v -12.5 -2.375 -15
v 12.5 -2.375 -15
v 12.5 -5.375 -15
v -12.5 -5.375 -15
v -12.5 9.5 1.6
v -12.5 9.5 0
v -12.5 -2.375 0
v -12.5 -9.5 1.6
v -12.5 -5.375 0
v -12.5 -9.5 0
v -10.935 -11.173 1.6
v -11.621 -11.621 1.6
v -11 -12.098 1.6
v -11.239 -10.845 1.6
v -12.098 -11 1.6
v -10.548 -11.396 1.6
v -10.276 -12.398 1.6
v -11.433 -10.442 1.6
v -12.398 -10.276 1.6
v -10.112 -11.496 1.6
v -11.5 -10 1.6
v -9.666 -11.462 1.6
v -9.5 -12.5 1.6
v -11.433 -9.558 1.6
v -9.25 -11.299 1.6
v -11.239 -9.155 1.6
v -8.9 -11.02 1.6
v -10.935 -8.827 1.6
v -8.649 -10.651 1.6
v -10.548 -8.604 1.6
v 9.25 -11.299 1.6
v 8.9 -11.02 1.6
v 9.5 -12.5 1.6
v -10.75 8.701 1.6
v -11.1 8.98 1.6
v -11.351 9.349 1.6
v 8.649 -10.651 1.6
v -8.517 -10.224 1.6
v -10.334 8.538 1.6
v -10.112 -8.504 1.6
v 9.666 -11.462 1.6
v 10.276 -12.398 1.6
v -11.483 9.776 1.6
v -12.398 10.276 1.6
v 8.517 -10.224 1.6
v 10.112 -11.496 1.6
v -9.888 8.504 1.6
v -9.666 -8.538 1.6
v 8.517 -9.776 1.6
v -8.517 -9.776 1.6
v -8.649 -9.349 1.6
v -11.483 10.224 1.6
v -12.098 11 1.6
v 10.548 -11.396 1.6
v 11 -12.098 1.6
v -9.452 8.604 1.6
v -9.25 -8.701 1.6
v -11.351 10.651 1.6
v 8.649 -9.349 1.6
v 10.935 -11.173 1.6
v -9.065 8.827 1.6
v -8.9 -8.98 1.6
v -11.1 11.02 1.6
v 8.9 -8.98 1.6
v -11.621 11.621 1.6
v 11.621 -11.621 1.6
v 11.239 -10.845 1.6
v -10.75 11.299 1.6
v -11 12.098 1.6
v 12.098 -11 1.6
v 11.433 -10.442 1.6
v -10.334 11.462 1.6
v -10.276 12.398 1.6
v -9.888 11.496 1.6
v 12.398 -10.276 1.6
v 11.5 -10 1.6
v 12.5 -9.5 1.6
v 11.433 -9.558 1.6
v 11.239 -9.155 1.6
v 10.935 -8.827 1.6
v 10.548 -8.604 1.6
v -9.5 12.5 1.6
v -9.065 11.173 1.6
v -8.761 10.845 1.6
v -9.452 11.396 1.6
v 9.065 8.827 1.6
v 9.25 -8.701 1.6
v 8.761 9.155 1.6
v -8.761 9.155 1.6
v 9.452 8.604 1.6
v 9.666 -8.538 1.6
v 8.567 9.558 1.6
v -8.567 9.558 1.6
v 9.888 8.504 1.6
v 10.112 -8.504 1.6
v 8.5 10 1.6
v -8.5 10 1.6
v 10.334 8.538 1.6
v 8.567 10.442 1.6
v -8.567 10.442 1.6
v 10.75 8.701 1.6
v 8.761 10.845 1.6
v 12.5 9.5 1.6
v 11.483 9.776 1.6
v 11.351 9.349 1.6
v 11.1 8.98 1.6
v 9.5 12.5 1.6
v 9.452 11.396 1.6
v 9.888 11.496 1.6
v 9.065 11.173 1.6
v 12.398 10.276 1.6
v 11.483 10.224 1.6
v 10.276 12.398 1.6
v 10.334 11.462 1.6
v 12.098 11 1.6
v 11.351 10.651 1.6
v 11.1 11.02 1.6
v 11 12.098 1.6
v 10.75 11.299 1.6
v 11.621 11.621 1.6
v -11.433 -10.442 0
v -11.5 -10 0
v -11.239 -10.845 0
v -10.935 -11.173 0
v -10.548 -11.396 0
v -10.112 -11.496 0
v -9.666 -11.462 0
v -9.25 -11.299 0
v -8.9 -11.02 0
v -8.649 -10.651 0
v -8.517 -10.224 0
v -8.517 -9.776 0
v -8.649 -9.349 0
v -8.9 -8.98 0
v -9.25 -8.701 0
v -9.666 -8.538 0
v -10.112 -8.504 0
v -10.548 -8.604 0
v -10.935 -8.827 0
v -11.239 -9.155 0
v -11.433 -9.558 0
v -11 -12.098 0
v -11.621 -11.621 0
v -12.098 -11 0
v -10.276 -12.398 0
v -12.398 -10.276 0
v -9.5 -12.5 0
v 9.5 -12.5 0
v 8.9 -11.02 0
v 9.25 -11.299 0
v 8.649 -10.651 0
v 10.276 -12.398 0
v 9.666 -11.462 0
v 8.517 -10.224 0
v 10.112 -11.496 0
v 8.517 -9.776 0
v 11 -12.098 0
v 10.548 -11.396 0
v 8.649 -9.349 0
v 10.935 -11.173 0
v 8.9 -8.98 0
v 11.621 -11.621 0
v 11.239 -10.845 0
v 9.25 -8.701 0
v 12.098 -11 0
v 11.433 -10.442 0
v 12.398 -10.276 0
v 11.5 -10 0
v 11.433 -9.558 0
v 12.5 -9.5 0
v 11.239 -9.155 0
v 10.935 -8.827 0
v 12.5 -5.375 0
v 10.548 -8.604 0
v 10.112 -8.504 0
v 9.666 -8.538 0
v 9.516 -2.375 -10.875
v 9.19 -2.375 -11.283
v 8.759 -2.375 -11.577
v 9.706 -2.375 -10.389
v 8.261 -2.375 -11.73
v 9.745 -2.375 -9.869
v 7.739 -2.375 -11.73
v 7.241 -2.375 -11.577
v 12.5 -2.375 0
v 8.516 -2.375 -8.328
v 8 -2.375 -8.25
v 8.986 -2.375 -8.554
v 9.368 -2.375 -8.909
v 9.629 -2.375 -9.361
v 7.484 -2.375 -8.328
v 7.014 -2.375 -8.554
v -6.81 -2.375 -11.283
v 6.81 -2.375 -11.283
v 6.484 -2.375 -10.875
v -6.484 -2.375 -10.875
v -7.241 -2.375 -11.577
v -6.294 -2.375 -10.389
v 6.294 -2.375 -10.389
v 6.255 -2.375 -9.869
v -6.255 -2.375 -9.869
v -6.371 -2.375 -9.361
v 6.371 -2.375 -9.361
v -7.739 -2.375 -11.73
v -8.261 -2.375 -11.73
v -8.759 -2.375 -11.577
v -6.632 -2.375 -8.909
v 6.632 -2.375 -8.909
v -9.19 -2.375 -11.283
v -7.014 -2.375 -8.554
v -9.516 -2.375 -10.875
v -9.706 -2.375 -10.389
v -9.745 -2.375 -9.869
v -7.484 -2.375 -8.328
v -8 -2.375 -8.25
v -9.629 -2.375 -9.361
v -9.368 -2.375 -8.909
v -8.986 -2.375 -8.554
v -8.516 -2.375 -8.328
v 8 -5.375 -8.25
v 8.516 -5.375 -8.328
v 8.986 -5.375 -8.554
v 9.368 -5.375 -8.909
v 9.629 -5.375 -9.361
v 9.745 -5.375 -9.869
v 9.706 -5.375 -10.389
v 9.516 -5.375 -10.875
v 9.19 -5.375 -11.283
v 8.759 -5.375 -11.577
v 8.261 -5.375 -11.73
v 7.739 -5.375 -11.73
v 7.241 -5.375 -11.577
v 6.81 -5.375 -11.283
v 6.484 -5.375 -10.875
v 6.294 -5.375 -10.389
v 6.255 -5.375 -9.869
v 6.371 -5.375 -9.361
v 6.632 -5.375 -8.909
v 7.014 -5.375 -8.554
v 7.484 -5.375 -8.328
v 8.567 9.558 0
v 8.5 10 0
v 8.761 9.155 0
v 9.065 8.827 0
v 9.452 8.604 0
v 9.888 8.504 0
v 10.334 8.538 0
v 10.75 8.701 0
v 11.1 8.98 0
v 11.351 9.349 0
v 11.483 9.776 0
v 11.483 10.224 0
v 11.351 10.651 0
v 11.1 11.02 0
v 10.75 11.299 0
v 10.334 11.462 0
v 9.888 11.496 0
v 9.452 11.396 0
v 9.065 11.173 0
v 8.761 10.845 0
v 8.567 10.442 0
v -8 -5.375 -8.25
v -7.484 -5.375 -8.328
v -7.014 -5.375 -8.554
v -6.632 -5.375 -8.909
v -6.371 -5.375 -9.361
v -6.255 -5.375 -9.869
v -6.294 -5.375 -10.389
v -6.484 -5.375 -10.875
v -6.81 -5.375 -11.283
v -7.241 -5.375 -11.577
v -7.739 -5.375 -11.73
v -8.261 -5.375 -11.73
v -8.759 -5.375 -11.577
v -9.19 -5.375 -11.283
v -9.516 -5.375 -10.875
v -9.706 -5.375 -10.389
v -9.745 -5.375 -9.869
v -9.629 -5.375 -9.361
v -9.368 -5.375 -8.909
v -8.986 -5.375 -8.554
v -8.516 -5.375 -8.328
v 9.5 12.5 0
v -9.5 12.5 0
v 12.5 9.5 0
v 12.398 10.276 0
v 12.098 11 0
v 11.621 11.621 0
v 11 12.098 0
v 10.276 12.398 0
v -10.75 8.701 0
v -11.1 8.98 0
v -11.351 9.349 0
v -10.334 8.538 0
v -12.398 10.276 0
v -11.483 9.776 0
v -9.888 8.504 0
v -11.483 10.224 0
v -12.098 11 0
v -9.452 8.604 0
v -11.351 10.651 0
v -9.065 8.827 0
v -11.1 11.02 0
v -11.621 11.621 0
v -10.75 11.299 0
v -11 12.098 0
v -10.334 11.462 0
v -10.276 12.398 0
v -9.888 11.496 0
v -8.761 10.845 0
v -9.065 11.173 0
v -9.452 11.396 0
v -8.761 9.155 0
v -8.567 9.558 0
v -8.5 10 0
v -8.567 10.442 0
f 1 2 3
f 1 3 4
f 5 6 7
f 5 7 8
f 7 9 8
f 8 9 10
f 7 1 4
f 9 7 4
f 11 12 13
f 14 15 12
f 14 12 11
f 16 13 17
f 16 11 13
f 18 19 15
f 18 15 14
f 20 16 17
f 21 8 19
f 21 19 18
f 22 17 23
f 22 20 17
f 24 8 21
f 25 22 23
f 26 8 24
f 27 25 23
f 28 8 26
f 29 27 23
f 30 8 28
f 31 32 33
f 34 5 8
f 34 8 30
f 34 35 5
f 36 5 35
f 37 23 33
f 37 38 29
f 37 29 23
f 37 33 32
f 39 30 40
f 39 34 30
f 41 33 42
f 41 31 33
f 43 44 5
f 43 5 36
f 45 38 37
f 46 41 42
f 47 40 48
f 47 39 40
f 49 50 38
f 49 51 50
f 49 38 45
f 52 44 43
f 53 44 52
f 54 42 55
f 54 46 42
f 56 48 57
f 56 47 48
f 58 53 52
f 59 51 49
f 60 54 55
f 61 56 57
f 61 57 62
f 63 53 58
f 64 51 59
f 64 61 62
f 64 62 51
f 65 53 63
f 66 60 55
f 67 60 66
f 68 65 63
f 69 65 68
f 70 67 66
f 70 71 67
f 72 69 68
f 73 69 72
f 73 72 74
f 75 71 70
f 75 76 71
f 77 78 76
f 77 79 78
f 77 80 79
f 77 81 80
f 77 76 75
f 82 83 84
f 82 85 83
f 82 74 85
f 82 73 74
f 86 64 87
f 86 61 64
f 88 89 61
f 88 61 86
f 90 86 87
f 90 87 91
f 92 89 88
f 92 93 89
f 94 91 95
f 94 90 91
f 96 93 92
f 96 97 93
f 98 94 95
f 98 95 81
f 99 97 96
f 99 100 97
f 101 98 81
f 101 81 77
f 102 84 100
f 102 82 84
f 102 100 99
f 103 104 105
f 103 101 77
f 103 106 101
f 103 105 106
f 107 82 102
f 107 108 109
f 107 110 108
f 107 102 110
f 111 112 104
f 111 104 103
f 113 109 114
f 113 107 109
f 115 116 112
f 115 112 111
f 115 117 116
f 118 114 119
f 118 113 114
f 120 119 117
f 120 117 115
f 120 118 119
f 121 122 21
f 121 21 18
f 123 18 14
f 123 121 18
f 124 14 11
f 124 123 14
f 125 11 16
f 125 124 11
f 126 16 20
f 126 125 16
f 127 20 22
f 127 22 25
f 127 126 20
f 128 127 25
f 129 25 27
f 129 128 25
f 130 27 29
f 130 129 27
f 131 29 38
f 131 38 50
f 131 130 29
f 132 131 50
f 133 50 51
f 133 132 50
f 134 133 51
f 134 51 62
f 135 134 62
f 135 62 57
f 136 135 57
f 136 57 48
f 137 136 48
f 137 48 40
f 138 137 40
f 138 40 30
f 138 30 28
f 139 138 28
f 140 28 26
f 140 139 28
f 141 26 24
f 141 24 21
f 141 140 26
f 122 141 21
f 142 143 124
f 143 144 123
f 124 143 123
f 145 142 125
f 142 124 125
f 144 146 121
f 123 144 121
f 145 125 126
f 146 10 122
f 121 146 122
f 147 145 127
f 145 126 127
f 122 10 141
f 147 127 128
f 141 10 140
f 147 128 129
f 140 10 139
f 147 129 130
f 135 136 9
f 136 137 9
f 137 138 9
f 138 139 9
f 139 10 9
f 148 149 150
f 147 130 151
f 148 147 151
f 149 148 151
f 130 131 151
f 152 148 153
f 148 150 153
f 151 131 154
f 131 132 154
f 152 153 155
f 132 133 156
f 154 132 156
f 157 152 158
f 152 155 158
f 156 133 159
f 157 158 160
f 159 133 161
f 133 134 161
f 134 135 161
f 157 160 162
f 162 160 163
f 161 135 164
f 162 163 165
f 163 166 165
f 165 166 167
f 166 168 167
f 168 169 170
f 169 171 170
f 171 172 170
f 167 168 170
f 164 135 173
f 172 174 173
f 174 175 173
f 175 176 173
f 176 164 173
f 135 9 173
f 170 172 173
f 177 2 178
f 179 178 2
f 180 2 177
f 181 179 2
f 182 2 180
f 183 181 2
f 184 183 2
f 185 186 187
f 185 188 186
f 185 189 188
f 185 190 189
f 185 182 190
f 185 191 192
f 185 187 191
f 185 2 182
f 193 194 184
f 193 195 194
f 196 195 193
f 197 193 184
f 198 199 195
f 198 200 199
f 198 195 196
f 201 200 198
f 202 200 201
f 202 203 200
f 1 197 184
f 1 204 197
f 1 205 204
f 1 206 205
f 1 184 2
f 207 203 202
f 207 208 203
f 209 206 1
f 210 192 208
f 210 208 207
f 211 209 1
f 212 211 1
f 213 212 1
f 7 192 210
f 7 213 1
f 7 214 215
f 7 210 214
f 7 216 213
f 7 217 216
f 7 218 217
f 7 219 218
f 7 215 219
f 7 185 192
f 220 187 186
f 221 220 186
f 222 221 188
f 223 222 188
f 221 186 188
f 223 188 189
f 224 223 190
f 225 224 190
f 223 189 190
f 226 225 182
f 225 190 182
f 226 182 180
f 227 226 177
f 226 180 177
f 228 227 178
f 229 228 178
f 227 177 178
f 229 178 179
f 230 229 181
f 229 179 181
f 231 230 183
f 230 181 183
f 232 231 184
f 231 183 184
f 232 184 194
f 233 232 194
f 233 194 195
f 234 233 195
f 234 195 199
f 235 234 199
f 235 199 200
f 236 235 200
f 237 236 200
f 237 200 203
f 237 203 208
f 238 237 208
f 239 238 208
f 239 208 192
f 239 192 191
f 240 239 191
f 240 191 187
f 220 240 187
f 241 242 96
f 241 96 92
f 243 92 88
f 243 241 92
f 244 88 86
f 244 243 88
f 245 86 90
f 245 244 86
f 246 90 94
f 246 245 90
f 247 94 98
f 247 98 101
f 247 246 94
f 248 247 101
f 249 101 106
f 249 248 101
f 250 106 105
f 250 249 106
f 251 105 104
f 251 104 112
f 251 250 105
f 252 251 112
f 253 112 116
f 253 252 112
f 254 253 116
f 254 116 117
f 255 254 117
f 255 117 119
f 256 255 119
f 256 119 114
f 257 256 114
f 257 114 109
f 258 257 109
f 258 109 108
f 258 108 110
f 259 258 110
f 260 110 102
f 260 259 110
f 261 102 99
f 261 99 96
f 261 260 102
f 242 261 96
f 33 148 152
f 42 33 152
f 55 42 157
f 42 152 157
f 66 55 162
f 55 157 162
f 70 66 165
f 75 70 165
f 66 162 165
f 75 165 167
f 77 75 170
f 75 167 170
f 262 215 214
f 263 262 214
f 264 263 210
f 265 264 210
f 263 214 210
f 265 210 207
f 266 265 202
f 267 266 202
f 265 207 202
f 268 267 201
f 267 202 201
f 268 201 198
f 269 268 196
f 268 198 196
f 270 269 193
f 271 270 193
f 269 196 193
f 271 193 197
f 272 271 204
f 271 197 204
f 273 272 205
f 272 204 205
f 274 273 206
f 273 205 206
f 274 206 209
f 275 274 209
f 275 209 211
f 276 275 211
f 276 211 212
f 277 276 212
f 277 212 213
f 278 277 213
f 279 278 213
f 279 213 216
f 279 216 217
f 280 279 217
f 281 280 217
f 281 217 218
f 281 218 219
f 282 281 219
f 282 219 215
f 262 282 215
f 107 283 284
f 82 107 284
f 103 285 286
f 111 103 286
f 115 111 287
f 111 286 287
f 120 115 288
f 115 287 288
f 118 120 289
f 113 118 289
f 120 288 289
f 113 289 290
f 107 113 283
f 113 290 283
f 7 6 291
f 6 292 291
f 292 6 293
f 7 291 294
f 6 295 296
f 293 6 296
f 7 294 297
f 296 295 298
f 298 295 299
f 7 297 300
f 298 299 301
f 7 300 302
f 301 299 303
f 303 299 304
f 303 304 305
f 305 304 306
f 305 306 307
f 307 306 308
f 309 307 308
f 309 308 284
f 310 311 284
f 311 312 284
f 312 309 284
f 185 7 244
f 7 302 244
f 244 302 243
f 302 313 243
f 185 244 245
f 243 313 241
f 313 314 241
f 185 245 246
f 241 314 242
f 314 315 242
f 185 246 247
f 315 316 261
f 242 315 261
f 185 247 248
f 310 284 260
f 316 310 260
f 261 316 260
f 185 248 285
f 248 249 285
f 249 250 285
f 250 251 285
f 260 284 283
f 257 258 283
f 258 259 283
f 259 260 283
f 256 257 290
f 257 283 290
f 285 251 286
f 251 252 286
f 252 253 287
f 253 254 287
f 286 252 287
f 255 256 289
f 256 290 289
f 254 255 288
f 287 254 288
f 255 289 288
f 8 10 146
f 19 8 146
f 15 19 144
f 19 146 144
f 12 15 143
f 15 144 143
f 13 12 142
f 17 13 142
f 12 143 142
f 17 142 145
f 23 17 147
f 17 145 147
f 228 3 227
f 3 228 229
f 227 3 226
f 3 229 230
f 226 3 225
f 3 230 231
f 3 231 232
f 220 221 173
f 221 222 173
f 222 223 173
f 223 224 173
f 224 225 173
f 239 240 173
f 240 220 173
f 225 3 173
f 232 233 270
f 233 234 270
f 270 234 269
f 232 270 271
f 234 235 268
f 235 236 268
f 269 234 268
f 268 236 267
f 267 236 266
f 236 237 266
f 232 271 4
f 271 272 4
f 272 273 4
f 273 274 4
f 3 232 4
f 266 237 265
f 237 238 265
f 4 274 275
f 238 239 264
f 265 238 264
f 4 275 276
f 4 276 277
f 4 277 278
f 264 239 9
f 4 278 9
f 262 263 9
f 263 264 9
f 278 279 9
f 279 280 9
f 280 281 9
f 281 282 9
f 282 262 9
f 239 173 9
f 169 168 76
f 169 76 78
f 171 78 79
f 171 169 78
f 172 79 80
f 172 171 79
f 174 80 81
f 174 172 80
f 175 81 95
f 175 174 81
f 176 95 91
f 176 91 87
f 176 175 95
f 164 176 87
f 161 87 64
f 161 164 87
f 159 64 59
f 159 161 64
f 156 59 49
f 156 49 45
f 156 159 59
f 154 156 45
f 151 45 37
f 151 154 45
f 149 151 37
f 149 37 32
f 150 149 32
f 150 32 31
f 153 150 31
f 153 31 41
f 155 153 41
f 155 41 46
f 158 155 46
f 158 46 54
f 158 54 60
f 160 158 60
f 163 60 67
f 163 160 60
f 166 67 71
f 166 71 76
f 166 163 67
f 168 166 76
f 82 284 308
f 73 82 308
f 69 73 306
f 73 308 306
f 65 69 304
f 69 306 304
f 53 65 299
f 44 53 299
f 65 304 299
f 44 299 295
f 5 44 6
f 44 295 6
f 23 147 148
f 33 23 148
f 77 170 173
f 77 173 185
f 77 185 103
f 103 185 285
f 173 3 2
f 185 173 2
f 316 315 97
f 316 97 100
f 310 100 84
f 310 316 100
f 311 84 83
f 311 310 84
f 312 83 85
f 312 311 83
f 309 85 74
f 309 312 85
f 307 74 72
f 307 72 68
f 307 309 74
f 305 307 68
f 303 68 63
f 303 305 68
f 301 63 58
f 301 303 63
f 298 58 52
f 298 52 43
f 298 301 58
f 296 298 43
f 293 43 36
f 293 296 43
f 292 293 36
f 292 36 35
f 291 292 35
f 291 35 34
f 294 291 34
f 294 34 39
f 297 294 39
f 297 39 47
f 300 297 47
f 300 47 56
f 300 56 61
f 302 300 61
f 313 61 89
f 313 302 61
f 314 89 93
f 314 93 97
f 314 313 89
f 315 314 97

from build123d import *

# Parameters (mm, degrees)
SKETCH1_R           = 1.5
BOSS_EXTRUDE1_DEPTH = 1.6
SKETCH2_W           = 25
SKETCH2_H           = 3
BOSS_EXTRUDE2_DEPTH = 15
SKETCH3_R           = 1.75
CUT_EXTRUDE1_DEPTH  = 25.546193697


with BuildPart() as part:
    # Sketch1 → Boss-Extrude1 (new body)
    with BuildSketch(Plane.XY):
        with BuildLine():
            Line((-9.5, -12.5), (9.5, -12.5))
            ThreePointArc((9.5, -12.5), (11.621320344, -11.621320344), (12.5, -9.5))
            Line((12.5, -9.5), (12.5, 9.5))
            ThreePointArc((12.5, 9.5), (11.621320344, 11.621320344), (9.5, 12.5))
            Line((9.5, 12.5), (-9.5, 12.5))
            ThreePointArc((-9.5, 12.5), (-11.621320344, 11.621320344), (-12.5, 9.5))
            Line((-12.5, 9.5), (-12.5, -9.5))
            ThreePointArc((-12.5, -9.5), (-11.621320344, -11.621320344), (-9.5, -12.5))
        make_face()
        with Locations((-10, 10)):
            Circle(SKETCH1_R, mode=Mode.SUBTRACT)
        with Locations(Location((10, 10, 0), (0, 0, 180))):
            Circle(SKETCH1_R, mode=Mode.SUBTRACT)
        with Locations((10, -10)):
            Circle(SKETCH1_R, mode=Mode.SUBTRACT)
        with Locations(Location((-10, -10, 0), (0, 0, 180))):
            Circle(SKETCH1_R, mode=Mode.SUBTRACT)
    extrude(amount=BOSS_EXTRUDE1_DEPTH)

    # Sketch2 → Boss-Extrude2 (add)
    with BuildSketch(Plane(origin=(0, 0, 0), x_dir=(-1, 0, 0), z_dir=(0, 0, -1))):
        with Locations((0, -3.875)):
            Rectangle(SKETCH2_W, SKETCH2_H)
    extrude(amount=BOSS_EXTRUDE2_DEPTH)

    # Sketch3 → Cut-Extrude1 (cut, through all)
    with BuildSketch(Plane(origin=(0, -2.375, 0), x_dir=(1, 0, 0), z_dir=(0, 1, 0))):
        with Locations(Location((-8, 10, 0), (0, 0, 270))):
            Circle(SKETCH3_R)
        with Locations(Location((8, 10, 0), (0, 0, 270))):
            Circle(SKETCH3_R)
    extrude(amount=-CUT_EXTRUDE1_DEPTH, mode=Mode.SUBTRACT)


solid = part.part
